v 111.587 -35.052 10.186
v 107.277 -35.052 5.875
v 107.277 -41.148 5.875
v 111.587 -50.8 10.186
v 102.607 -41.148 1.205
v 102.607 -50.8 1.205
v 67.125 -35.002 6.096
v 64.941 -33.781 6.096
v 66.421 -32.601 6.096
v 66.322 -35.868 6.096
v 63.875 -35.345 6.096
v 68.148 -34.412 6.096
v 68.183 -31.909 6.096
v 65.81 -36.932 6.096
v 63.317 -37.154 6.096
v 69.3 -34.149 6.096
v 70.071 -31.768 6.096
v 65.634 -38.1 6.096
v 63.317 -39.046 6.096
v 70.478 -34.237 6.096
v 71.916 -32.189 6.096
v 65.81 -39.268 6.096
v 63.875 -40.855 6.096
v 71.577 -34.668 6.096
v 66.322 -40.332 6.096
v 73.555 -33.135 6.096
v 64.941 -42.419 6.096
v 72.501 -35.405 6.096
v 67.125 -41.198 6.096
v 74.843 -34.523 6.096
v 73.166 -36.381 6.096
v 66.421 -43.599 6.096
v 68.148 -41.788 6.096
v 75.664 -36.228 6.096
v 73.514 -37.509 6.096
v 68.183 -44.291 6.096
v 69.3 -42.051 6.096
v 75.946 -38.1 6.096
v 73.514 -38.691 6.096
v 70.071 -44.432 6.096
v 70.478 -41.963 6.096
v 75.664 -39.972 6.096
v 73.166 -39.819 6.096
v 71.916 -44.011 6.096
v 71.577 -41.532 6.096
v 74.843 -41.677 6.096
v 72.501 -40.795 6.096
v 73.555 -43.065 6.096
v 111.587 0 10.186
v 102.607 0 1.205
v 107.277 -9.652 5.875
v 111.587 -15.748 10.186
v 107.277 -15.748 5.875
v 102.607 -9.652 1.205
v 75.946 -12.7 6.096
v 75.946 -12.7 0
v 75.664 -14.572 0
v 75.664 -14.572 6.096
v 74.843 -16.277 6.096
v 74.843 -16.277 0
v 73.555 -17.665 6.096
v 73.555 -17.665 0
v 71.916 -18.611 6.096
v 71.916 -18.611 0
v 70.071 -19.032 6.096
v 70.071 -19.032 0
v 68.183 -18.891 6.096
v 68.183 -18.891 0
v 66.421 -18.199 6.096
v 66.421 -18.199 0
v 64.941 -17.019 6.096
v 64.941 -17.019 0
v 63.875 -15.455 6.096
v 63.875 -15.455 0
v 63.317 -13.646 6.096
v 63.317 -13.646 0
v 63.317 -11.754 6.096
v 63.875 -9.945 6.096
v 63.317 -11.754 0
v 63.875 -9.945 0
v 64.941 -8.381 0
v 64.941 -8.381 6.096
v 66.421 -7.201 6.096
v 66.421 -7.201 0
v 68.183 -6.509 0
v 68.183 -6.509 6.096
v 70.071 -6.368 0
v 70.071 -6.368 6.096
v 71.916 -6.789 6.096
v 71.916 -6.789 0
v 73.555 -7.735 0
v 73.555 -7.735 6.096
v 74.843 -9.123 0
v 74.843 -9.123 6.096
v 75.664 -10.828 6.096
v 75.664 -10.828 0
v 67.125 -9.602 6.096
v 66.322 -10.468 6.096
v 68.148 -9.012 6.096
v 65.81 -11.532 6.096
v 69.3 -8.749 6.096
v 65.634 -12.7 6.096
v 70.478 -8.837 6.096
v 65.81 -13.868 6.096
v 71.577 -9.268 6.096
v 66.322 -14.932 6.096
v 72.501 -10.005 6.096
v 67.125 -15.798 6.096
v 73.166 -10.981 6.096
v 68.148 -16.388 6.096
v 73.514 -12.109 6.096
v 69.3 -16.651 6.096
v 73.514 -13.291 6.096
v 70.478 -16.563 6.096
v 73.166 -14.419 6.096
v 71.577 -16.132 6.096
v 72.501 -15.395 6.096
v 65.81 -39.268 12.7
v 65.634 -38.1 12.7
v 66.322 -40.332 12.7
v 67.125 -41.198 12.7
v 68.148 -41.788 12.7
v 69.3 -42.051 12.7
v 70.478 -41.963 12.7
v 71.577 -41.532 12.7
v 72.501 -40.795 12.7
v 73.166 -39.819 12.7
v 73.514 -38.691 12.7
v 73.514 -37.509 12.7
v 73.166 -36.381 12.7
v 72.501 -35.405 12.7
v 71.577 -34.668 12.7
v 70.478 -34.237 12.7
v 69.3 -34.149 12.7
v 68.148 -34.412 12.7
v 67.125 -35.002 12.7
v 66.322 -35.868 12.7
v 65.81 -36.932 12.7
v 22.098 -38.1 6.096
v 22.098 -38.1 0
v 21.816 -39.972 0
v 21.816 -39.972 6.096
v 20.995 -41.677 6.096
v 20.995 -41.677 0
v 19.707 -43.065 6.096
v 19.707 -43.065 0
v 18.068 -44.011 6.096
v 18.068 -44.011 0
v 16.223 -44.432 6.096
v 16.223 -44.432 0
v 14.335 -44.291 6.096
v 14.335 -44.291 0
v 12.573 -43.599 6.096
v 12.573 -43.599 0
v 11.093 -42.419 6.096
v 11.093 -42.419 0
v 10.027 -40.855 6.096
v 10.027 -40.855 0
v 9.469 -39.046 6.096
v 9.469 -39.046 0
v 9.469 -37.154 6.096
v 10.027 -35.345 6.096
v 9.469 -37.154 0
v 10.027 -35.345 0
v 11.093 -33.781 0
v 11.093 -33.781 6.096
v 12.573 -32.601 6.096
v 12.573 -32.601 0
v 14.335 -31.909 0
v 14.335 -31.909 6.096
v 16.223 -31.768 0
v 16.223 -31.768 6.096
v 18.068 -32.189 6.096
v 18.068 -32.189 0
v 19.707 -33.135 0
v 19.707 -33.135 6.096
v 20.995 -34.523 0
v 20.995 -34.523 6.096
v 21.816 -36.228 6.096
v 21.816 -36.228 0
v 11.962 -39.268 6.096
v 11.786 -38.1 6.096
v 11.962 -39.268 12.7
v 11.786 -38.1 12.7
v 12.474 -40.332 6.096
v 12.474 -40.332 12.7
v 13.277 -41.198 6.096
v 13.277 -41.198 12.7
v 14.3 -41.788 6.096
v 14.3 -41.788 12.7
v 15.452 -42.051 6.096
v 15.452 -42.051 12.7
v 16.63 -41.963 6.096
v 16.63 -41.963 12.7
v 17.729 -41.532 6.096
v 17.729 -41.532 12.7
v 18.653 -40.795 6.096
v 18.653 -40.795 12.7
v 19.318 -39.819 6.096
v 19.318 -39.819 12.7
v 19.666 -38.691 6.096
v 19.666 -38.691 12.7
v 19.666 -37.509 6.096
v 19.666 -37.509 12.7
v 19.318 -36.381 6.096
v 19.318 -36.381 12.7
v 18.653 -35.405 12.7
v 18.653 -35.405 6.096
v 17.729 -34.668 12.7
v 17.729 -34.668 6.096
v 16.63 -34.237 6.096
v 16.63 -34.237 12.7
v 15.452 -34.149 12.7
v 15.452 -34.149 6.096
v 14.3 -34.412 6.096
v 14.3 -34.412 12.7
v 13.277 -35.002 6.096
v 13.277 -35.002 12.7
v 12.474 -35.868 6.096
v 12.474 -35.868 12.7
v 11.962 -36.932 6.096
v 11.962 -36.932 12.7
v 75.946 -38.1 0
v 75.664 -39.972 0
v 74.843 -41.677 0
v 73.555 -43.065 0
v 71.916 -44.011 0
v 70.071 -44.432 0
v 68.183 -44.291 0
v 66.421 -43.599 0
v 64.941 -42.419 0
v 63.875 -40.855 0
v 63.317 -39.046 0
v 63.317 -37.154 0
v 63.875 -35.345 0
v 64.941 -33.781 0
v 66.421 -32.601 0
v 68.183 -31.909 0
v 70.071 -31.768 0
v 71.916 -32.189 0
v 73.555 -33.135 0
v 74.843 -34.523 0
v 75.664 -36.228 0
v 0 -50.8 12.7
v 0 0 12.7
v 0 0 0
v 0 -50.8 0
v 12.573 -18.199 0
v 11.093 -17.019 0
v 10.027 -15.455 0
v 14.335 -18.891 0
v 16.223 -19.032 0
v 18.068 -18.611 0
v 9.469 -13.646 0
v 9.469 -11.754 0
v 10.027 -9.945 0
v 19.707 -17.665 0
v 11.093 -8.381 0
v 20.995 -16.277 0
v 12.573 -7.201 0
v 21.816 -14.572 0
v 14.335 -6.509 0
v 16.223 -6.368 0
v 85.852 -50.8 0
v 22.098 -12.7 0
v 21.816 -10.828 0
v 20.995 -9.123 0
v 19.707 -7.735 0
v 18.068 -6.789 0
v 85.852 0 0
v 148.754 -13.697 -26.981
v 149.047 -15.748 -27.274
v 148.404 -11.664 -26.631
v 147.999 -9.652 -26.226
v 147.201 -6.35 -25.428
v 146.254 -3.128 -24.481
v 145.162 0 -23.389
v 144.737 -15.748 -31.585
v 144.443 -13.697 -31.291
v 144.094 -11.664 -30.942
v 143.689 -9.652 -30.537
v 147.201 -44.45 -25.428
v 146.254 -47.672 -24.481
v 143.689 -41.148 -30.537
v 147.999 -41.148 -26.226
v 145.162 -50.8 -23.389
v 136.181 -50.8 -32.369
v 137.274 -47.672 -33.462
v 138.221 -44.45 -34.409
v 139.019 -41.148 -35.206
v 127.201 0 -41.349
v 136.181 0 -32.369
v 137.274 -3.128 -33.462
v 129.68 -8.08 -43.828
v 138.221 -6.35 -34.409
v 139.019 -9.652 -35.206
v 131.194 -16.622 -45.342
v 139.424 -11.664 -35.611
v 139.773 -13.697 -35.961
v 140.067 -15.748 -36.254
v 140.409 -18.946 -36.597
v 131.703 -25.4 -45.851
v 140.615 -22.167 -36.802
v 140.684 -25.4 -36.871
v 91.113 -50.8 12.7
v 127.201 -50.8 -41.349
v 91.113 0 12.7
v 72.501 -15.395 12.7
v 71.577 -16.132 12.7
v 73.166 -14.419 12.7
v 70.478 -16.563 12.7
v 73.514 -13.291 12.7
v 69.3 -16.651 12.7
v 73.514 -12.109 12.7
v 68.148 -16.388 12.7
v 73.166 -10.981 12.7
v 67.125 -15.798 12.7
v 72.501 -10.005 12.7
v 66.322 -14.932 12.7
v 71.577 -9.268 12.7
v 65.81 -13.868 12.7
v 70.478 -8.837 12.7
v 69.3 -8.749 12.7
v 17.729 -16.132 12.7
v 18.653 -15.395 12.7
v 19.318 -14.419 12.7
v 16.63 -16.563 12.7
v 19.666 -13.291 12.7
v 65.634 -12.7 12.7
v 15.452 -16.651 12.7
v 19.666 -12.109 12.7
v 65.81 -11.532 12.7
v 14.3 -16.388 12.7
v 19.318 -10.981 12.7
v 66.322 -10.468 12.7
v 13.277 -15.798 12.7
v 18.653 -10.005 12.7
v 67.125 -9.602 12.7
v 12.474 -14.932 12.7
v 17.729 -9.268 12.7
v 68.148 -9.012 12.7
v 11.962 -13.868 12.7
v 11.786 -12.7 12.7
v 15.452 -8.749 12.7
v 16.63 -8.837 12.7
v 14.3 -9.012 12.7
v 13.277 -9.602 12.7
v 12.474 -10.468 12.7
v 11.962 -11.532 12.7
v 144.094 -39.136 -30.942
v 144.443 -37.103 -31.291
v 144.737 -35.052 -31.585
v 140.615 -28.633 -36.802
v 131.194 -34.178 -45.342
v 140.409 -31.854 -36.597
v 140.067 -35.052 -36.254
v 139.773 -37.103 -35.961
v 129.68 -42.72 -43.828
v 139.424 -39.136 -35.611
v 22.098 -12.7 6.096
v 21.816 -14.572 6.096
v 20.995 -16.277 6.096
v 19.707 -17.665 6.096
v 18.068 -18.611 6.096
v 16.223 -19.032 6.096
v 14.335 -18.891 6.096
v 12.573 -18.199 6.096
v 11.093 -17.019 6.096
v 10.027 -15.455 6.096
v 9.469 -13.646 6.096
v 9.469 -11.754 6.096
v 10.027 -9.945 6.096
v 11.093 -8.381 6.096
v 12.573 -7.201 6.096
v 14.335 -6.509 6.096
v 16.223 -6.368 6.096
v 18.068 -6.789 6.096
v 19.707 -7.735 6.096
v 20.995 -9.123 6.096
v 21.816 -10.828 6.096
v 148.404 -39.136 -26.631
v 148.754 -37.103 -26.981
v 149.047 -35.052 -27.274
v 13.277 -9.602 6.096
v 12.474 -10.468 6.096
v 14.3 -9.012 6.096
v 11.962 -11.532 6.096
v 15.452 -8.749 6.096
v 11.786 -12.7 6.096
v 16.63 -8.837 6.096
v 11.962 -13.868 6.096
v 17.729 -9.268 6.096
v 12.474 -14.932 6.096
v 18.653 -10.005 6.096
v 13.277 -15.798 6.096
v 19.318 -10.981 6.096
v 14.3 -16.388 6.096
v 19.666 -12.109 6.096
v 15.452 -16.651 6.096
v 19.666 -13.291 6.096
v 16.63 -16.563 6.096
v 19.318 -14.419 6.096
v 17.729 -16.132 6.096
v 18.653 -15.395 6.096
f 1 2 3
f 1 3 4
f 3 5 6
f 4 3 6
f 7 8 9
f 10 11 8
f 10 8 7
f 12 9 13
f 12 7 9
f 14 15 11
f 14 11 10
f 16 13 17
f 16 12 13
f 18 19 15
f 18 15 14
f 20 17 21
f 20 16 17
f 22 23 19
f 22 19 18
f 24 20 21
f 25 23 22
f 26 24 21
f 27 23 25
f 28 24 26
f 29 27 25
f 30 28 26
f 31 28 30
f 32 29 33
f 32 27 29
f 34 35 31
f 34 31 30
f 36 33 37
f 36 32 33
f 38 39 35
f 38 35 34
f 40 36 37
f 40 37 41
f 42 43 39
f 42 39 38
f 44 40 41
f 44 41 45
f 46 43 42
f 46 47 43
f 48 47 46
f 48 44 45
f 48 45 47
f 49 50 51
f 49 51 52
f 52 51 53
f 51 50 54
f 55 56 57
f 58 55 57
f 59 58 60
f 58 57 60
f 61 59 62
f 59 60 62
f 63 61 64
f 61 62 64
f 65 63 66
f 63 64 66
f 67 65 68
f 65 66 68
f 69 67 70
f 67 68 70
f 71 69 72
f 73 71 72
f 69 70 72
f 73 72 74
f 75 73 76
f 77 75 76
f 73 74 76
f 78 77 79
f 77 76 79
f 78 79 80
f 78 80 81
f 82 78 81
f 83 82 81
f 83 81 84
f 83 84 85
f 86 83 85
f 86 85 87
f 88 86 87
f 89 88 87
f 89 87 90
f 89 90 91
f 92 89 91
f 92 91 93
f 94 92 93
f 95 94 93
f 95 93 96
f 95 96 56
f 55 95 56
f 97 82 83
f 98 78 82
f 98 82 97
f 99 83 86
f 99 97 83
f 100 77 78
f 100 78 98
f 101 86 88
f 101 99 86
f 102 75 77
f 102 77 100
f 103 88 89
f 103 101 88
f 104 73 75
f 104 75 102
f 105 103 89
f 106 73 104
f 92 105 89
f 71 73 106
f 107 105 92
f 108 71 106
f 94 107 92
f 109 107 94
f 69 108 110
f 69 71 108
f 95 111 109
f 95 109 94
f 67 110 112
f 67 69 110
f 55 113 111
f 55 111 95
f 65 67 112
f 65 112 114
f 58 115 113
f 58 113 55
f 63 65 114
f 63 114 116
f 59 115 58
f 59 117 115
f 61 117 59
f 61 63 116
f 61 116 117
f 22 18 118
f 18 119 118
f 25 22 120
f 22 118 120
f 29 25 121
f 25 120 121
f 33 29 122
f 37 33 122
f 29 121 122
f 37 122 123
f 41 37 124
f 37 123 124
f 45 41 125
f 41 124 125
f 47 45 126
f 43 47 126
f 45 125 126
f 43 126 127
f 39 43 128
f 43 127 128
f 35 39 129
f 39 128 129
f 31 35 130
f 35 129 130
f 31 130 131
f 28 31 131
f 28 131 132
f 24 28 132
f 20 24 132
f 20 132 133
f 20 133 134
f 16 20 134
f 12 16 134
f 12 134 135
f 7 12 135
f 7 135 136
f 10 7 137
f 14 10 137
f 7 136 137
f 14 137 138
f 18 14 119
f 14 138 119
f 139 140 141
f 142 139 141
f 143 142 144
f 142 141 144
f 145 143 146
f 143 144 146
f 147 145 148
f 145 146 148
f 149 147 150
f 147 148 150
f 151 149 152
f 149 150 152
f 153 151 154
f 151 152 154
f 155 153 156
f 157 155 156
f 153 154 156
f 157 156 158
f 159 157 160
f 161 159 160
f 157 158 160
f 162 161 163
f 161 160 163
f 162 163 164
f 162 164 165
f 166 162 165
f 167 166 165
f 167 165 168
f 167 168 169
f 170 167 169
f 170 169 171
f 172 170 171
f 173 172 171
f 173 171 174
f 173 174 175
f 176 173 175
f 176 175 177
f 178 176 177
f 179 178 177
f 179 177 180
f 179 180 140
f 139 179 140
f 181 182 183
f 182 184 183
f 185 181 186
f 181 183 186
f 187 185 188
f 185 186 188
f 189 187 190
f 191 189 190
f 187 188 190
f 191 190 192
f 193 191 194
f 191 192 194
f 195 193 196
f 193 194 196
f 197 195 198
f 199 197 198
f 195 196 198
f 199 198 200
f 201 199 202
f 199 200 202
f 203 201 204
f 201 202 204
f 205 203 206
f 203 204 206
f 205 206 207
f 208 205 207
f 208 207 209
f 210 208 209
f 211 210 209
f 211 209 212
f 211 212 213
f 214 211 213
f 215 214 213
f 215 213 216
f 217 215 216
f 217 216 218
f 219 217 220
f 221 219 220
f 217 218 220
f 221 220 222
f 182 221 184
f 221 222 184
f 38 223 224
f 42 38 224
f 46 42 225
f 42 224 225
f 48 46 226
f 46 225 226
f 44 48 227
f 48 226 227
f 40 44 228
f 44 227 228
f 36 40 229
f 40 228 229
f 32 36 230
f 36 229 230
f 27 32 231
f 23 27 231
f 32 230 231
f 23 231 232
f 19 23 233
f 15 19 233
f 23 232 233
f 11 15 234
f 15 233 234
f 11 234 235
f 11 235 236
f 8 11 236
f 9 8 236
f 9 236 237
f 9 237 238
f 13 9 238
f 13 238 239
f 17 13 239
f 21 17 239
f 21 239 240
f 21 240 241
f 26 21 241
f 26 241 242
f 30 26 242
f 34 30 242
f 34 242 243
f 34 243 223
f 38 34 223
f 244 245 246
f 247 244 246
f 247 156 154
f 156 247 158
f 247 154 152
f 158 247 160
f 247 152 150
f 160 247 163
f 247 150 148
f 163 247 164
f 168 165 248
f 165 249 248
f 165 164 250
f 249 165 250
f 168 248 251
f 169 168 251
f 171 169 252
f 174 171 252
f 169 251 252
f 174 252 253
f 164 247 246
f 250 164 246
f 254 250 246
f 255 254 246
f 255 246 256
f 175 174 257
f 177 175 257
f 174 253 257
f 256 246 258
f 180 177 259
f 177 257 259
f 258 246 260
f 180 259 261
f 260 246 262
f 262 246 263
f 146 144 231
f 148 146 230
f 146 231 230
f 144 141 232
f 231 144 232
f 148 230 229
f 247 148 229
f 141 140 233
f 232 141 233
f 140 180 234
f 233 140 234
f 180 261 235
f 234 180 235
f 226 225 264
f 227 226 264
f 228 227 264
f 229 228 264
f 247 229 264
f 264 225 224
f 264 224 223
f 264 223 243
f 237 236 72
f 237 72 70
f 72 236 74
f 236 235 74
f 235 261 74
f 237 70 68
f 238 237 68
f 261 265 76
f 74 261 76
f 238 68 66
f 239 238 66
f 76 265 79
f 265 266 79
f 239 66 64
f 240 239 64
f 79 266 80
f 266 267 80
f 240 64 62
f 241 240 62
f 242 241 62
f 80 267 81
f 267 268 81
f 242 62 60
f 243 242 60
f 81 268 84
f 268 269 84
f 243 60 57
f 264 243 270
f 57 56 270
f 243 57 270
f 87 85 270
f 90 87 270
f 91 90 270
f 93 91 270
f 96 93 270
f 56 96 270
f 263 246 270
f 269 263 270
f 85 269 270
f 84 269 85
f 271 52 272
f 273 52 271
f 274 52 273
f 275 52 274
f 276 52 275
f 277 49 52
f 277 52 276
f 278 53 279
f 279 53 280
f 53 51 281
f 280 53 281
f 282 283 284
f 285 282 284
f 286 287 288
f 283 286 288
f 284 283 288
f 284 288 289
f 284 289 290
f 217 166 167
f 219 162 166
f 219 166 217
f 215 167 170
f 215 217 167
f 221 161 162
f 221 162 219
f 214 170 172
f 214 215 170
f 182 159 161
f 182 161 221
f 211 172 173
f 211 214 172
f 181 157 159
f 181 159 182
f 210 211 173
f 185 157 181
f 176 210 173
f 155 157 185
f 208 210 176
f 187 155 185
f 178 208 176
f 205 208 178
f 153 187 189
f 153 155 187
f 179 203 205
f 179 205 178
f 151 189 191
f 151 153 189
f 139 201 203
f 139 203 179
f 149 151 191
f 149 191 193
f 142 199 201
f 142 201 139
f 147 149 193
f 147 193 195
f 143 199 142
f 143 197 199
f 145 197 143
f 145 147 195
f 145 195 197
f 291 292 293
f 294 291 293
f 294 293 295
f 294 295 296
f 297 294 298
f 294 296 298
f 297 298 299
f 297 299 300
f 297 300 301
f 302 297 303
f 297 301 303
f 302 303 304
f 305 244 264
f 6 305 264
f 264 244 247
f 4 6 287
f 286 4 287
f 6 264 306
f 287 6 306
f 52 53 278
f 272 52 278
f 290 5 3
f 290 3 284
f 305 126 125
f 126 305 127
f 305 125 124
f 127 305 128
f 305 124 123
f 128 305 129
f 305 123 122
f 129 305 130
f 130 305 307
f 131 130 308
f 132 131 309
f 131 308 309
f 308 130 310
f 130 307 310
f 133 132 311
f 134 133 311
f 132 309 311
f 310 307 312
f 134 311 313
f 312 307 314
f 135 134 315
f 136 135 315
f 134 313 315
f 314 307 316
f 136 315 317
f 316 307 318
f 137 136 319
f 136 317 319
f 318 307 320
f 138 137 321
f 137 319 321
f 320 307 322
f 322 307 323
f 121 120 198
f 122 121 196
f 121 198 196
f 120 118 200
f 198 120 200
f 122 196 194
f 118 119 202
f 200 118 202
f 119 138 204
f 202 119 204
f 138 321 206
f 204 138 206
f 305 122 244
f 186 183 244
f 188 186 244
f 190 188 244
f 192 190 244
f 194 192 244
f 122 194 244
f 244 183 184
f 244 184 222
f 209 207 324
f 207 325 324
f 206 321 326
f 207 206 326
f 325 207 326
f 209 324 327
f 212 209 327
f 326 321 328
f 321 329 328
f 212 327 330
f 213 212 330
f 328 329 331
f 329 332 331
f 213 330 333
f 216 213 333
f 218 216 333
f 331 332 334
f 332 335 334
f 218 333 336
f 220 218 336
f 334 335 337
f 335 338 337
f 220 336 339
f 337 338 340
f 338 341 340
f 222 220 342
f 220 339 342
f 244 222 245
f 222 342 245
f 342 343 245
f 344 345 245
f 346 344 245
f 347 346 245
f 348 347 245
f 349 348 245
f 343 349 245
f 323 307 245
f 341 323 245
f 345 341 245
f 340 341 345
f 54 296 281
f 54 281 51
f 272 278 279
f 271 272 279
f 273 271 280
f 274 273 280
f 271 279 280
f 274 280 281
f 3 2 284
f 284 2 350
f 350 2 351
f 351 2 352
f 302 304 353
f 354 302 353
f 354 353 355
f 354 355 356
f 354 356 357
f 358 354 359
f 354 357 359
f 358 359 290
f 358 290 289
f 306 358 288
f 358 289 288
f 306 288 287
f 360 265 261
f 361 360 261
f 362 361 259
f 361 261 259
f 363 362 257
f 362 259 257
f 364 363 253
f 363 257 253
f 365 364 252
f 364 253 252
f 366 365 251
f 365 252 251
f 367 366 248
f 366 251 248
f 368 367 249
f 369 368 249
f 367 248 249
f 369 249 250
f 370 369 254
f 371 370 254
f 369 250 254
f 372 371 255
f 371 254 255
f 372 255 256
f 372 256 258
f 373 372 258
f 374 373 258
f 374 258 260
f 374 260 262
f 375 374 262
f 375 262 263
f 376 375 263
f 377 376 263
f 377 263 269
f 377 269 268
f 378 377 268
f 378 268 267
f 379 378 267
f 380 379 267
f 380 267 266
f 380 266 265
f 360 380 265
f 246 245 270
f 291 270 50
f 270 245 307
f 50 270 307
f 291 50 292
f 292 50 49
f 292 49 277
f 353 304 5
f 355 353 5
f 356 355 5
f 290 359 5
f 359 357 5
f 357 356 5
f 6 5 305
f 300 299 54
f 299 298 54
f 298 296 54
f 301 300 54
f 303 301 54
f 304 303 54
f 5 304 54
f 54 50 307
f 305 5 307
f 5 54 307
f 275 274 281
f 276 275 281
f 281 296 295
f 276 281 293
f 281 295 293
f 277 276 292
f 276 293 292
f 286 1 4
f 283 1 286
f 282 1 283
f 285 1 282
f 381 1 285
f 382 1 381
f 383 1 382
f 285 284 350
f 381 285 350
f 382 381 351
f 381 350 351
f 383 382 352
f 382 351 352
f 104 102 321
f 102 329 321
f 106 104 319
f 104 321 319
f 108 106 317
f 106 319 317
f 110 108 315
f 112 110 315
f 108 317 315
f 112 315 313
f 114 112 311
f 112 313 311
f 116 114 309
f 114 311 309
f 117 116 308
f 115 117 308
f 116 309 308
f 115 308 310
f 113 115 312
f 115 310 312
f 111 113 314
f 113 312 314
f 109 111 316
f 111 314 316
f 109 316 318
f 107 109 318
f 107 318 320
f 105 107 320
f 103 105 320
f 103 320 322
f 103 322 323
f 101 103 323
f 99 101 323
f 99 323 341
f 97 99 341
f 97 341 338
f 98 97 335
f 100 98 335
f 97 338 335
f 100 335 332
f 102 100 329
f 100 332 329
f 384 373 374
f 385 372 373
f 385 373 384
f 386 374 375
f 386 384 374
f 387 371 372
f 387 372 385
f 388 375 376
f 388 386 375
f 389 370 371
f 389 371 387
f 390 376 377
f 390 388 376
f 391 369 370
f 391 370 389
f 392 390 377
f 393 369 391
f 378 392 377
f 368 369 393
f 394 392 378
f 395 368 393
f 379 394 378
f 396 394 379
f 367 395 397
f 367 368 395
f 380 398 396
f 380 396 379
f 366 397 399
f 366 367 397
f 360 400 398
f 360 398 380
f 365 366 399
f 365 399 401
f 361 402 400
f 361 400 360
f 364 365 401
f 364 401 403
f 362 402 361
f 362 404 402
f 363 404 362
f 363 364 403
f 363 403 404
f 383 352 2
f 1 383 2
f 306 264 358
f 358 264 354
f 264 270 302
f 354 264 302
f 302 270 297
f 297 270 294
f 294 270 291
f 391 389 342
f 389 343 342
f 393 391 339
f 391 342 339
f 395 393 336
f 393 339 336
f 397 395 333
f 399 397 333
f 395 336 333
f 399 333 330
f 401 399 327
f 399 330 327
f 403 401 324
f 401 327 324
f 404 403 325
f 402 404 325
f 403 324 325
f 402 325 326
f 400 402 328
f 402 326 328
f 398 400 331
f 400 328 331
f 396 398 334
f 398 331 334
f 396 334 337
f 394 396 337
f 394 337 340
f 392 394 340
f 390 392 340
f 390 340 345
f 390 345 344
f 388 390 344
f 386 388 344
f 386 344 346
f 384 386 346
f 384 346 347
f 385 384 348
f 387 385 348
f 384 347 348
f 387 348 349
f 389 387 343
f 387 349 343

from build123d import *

# Parameters (mm, degrees)
F1_DEPTH       = 50.8
F4_D           = 7.9248
F4_DEPTH       = 35.56
F4_CBORE_D     = 12.7
F4_CBORE_DEPTH = 6.096
F4_TIP         = 2.3808501168
F6_DEPTH       = 105.8292752574
F8_DEPTH       = 12.7
F9_DEPTH       = 6.604


with BuildPart() as f1:
    # F0 (on Front) → F1 (new body)
    with BuildSketch(Plane.XZ):
        Polygon((0, 12.7), (0, 0), (85.852, 0), (131.7032699094, -45.8512699094), (140.6835260304, -36.8710137883), (91.1125122421, 12.7), align=None)
    extrude(amount=F1_DEPTH)

    # F4
    with Locations(Plane(origin=(0, 0, 0), x_dir=(1, 0, 0), z_dir=(0, 0, -1))):
        with Locations((15.748, 38.1), (69.596, 38.1), (69.596, 12.7), (15.748, 12.7)):
            CounterBoreHole(F4_D / 2, F4_CBORE_D / 2, F4_CBORE_DEPTH, depth=F4_DEPTH)
            with Locations((0, 0, -(F4_DEPTH + F4_TIP / 2))):  # 118° drill point
                Cone(0, F4_D / 2, F4_TIP, mode=Mode.SUBTRACT)

    # F5 (on face) → F6 (cut, through all)
    with BuildSketch(Plane(origin=(51.9062561211, 0, 51.9062561211), x_dir=(0.7071067812, 0, -0.7071067812), z_dir=(0.7071067812, 0, 0.7071067812))):
        with BuildLine():
            ThreePointArc((125.5500191363, -25.4), (123.9340255134, -38.4929222795), (119.183037491, -50.8))
            Line((119.183037491, -50.8), (125.5500191363, -50.8))
            Line((125.5500191363, -50.8), (125.5500191363, -25.4))
        make_face()
        with BuildLine():
            ThreePointArc((119.183037491, 0), (123.9340255134, -12.3070777205), (125.5500191363, -25.4))
            Line((125.5500191363, -25.4), (125.5500191363, 0))
            Line((125.5500191363, 0), (119.183037491, 0))
        make_face()
    extrude(amount=-F6_DEPTH, mode=Mode.SUBTRACT)

    # F7 (on face) → F8 (join)
    with BuildSketch(Plane(origin=(51.9062561211, 0, 51.9062561211), x_dir=(0.7071067812, 0, -0.7071067812), z_dir=(0.7071067812, 0, 0.7071067812))):
        with BuildLine():
            Line((71.7020191363, -41.148), (71.7020191363, -50.8))
            Line((71.7020191363, -50.8), (119.183037491, -50.8))
            ThreePointArc((119.183037491, -50.8), (121.4241681108, -46.0715990033), (123.1957818654, -41.148))
            Line((123.1957818654, -41.148), (71.7020191363, -41.148))
        make_face()
        with BuildLine():
            Line((119.183037491, 0), (71.7020191363, 0))
            Line((71.7020191363, 0), (71.7020191363, -9.652))
            Line((71.7020191363, -9.652), (123.1957818654, -9.652))
            ThreePointArc((123.1957818654, -9.652), (121.4241681108, -4.7284009967), (119.183037491, 0))
        make_face()
        with BuildLine():
            Line((71.7020191363, -35.052), (71.7020191363, -41.148))
            Line((71.7020191363, -41.148), (123.1957818654, -41.148))
            ThreePointArc((123.1957818654, -41.148), (124.0257032683, -38.1216029987), (124.6779193174, -35.052))
            Line((124.6779193174, -35.052), (71.7020191363, -35.052))
        make_face()
        with BuildLine():
            Line((71.7020191363, -9.652), (71.7020191363, -15.748))
            Line((71.7020191363, -15.748), (124.6779193174, -15.748))
            ThreePointArc((124.6779193174, -15.748), (124.0257032683, -12.6783970013), (123.1957818654, -9.652))
            Line((123.1957818654, -9.652), (71.7020191363, -9.652))
        make_face()
    extrude(amount=F8_DEPTH)

    # F7 (on face) → F9 (cut)
    with BuildSketch(Plane(origin=(51.9062561211, 0, 51.9062561211), x_dir=(0.7071067812, 0, -0.7071067812), z_dir=(0.7071067812, 0, 0.7071067812))):
        with BuildLine():
            Line((71.7020191363, -35.052), (71.7020191363, -41.148))
            Line((71.7020191363, -41.148), (123.1957818654, -41.148))
            ThreePointArc((123.1957818654, -41.148), (124.0257032683, -38.1216029987), (124.6779193174, -35.052))
            Line((124.6779193174, -35.052), (71.7020191363, -35.052))
        make_face()
        with BuildLine():
            Line((71.7020191363, -9.652), (71.7020191363, -15.748))
            Line((71.7020191363, -15.748), (124.6779193174, -15.748))
            ThreePointArc((124.6779193174, -15.748), (124.0257032683, -12.6783970013), (123.1957818654, -9.652))
            Line((123.1957818654, -9.652), (71.7020191363, -9.652))
        make_face()
    extrude(amount=F9_DEPTH, mode=Mode.SUBTRACT)


solid = f1.part
